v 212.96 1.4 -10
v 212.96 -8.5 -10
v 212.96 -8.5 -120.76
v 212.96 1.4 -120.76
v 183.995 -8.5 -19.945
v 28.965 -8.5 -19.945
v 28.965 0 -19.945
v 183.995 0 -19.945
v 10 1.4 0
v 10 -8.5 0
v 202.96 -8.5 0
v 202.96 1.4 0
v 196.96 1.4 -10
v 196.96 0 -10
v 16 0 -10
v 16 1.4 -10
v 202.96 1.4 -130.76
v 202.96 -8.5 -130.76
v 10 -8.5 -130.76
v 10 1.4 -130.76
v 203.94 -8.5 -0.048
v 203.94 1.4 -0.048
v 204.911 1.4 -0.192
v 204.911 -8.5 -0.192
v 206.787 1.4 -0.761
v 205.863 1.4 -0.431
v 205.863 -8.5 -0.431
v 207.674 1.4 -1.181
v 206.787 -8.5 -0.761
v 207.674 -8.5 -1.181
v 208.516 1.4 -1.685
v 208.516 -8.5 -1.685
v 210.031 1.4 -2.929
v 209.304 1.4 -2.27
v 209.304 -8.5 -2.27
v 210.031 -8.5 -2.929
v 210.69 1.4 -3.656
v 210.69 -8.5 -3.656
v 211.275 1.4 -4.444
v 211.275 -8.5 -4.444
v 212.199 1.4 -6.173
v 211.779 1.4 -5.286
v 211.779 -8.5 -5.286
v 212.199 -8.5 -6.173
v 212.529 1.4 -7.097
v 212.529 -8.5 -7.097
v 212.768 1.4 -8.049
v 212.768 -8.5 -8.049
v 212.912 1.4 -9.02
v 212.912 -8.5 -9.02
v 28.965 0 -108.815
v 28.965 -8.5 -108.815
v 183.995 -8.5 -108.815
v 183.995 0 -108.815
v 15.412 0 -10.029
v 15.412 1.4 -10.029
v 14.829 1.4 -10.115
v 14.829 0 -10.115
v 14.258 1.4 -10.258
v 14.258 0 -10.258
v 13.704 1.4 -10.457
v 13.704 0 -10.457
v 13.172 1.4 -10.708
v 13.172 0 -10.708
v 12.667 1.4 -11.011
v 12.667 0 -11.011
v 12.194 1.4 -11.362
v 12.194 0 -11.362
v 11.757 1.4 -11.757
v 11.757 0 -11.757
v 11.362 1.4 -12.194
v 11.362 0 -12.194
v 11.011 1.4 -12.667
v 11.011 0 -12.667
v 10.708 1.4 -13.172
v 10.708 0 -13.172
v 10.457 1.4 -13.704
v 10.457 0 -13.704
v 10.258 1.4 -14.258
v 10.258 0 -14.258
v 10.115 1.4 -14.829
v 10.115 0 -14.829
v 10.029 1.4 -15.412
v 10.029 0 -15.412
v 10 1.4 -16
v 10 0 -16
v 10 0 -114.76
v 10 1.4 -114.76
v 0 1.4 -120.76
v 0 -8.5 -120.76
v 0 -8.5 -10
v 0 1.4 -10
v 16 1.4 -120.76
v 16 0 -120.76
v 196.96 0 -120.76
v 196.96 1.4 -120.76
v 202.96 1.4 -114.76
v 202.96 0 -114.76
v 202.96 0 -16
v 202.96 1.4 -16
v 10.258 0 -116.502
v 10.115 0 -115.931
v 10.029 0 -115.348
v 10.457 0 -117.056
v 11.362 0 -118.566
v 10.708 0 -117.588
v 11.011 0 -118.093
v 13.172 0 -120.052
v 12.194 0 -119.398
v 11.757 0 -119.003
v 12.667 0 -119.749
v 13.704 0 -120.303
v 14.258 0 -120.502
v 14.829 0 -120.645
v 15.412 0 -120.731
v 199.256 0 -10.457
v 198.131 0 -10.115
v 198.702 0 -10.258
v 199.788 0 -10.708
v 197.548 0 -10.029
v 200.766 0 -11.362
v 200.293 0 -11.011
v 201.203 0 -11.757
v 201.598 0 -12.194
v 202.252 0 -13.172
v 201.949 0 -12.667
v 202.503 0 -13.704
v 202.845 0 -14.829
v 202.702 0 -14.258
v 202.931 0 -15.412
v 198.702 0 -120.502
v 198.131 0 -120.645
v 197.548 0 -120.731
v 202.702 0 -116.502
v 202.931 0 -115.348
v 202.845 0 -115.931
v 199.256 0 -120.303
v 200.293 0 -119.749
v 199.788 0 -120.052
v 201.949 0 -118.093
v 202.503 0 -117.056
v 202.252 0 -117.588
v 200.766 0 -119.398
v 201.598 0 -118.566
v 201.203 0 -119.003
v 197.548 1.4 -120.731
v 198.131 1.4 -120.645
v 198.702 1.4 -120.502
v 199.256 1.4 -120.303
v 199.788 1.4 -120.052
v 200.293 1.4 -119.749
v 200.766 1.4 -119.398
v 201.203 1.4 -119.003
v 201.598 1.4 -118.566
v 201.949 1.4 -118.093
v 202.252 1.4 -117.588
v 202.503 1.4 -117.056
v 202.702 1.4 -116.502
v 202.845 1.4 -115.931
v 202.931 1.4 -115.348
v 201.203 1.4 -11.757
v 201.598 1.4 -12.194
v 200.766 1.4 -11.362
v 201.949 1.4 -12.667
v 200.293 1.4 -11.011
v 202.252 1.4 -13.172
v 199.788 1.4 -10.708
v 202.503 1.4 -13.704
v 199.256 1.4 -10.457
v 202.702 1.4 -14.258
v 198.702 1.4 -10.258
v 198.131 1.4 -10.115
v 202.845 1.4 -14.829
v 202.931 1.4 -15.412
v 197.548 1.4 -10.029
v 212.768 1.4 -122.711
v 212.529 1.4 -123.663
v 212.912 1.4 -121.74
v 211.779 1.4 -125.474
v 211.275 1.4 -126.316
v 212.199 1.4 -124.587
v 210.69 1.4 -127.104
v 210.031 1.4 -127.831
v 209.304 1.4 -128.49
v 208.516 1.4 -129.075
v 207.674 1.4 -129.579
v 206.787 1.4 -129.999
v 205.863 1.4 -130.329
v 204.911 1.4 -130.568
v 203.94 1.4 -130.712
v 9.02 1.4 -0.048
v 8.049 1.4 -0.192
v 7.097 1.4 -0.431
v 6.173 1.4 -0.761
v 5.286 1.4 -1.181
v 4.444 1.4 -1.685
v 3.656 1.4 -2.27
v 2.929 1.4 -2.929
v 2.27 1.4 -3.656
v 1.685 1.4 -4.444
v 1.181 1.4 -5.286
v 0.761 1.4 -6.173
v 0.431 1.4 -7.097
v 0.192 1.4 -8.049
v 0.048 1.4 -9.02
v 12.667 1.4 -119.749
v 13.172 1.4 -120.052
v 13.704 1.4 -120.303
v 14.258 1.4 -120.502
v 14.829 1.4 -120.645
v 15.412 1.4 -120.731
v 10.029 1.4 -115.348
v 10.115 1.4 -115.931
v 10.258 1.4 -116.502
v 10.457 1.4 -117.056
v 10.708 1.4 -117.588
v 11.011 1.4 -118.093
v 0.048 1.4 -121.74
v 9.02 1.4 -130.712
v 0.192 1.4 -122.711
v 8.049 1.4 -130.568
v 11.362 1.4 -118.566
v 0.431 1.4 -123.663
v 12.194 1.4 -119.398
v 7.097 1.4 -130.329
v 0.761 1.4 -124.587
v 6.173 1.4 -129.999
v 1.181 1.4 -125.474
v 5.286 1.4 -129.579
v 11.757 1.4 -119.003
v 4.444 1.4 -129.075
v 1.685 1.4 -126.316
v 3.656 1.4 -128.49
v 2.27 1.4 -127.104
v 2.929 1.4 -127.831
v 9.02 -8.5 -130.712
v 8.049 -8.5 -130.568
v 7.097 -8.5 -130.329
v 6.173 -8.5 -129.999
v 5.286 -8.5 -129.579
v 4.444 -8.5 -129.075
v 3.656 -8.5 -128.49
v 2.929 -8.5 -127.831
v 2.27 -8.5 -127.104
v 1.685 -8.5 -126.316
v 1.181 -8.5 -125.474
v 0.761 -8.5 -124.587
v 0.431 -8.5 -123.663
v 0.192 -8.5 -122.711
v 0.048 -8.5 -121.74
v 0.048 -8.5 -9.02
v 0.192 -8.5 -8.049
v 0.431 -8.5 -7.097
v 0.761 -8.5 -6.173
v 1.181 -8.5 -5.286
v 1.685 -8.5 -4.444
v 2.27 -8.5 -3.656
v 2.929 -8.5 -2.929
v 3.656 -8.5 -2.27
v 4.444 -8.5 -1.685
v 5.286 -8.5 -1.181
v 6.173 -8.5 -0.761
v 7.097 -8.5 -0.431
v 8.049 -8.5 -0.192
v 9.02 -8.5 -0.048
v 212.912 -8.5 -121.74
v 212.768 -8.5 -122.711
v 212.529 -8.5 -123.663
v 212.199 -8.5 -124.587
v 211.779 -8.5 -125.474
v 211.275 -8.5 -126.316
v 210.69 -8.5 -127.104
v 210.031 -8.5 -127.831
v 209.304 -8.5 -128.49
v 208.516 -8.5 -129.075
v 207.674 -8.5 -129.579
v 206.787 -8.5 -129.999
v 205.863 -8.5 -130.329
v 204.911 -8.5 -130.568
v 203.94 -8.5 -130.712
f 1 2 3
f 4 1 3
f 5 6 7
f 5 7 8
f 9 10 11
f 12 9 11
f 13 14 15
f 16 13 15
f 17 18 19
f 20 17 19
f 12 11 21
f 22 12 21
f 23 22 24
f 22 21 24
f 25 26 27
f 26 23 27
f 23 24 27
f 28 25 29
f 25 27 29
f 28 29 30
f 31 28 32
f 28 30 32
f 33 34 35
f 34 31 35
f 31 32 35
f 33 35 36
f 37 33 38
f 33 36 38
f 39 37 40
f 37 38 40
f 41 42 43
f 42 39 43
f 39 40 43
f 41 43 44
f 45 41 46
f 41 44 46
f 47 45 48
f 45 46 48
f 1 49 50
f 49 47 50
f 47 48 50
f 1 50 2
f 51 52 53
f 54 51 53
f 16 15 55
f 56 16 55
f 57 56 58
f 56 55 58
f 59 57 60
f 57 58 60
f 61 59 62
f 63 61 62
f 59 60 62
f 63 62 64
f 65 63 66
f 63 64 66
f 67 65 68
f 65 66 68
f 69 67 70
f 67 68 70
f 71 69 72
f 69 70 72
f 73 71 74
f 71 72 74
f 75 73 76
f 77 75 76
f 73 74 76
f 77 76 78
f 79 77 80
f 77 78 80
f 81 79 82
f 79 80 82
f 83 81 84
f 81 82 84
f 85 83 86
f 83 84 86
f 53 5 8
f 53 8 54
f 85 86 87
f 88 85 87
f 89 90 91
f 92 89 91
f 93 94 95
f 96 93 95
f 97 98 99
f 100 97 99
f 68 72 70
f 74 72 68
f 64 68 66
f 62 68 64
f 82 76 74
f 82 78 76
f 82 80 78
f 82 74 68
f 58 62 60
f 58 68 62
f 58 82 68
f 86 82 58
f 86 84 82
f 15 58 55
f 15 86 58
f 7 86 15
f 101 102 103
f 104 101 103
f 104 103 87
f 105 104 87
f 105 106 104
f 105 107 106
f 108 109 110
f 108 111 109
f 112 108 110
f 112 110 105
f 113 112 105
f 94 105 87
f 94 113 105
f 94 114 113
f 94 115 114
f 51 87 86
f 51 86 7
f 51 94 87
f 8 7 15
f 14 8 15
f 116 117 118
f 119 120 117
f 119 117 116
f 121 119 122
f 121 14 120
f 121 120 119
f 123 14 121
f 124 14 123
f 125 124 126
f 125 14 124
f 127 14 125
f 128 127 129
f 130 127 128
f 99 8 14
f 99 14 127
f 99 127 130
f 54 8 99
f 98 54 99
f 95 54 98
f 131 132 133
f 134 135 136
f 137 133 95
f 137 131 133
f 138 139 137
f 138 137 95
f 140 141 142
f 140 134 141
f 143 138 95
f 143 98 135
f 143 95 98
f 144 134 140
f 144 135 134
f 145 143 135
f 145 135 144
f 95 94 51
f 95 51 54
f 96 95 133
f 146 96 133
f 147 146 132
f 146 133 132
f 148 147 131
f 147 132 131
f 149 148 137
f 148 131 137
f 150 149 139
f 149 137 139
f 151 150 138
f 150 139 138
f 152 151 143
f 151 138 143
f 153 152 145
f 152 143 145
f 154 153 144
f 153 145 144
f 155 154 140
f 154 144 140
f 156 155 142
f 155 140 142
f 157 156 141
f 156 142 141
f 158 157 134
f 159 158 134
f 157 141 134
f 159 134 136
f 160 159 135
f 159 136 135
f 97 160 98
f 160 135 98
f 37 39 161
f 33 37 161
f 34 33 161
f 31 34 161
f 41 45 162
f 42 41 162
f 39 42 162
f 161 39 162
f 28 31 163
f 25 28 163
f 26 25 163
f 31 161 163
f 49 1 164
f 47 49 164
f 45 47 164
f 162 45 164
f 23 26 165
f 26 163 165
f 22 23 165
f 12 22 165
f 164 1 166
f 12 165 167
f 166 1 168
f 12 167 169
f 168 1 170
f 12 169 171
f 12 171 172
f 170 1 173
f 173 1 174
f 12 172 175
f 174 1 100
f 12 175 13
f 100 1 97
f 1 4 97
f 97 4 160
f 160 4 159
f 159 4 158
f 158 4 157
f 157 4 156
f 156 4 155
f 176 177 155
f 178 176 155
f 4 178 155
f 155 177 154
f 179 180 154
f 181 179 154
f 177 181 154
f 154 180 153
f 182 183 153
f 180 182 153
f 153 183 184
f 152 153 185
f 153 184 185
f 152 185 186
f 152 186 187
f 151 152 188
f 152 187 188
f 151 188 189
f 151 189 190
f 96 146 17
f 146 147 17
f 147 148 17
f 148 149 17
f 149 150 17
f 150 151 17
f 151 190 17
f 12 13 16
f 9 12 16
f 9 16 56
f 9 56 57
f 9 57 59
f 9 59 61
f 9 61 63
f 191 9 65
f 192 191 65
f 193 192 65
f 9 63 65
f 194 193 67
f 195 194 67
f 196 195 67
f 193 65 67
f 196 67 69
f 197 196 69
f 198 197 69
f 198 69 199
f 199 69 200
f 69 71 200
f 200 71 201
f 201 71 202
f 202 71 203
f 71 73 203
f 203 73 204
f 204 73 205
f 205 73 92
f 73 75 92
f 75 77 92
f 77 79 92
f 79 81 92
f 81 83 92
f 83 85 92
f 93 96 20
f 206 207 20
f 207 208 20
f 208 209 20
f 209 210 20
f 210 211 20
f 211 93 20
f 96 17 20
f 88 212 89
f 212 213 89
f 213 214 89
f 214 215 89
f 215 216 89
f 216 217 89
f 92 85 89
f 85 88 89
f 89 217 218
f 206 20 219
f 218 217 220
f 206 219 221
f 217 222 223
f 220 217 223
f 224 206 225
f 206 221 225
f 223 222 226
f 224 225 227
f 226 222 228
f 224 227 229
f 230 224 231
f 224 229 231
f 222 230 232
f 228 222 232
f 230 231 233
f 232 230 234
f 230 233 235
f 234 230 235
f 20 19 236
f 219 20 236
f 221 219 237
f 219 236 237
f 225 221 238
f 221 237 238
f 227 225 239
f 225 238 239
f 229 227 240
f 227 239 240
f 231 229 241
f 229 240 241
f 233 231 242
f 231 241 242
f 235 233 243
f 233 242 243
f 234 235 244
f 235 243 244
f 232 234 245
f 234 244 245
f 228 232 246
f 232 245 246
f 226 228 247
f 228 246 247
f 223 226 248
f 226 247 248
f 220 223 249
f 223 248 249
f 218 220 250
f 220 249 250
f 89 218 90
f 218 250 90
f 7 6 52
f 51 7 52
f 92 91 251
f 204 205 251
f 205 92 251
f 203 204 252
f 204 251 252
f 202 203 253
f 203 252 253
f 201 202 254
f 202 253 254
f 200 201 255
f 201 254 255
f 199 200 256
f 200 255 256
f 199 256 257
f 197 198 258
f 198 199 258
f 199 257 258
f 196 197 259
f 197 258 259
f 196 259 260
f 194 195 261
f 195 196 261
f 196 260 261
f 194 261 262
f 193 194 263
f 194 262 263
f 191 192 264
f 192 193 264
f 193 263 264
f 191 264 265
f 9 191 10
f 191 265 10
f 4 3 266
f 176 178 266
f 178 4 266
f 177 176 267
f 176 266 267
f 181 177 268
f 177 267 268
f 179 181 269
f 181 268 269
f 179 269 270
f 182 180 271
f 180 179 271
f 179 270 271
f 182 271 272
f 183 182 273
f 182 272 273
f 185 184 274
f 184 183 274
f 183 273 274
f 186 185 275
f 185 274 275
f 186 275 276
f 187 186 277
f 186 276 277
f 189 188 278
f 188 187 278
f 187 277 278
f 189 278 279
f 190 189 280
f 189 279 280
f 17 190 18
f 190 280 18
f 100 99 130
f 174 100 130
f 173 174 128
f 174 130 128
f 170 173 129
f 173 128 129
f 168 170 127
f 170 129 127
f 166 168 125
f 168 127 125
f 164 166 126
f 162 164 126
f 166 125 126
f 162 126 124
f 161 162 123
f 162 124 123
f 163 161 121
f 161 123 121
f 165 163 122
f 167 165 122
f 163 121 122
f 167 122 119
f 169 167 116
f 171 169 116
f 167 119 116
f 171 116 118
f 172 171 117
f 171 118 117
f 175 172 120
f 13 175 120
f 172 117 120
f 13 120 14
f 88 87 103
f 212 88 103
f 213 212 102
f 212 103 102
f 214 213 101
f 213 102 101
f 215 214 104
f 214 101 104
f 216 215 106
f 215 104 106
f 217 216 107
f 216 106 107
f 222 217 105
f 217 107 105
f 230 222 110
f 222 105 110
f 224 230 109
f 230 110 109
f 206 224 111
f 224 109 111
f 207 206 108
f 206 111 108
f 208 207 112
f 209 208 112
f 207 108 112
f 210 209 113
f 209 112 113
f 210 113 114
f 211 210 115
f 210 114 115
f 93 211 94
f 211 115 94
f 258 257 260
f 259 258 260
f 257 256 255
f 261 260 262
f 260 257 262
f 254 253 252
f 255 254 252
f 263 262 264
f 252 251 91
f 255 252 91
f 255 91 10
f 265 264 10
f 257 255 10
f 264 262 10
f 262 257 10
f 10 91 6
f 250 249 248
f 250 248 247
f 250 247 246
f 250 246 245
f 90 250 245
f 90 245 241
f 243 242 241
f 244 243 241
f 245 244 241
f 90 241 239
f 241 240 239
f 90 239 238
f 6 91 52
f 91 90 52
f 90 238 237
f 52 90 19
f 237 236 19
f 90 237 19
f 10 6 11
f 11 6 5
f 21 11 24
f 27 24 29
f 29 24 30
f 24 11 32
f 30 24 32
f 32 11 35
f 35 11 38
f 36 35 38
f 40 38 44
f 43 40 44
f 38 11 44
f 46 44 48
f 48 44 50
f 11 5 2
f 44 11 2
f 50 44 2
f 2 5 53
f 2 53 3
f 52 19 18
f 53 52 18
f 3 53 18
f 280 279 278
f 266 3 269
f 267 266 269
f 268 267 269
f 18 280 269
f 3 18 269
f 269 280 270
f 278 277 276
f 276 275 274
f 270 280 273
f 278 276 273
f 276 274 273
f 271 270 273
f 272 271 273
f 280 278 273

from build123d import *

# Parameters (mm, degrees)
BOSS_EXTRUDE1_DEPTH = 1.4
BOSS_EXTRUDE2_START = -8.5
FRONT_FACE_3_W      = 155.03
FRONT_FACE_3_H      = 88.87
BOSS_EXTRUDE2_DEPTH = 8.5


with BuildPart() as part:
    # Front Face → Boss-Extrude1 (new body)
    with BuildSketch(Plane(origin=(0, 0, 0), x_dir=(1, 0, 0), z_dir=(0, 1, 0))):
        with BuildLine():
            ThreePointArc((0, 10), (2.928932188, 2.928932188), (10, 0))
            Line((10, 0), (202.96, 0))
            ThreePointArc((202.96, 0), (210.031067812, 2.928932188), (212.96, 10))
            Line((212.96, 10), (212.96, 120.76))
            ThreePointArc((212.96, 120.76), (210.031067812, 127.831067812), (202.96, 130.76))
            Line((202.96, 130.76), (10, 130.76))
            ThreePointArc((10, 130.76), (2.928932188, 127.831067812), (0, 120.76))
            Line((0, 120.76), (0, 10))
        make_face()
        with BuildLine():
            Line((196.96, 10), (16, 10))
            ThreePointArc((16, 10), (11.757359313, 11.757359313), (10, 16))
            Line((10, 16), (10, 114.76))
            ThreePointArc((10, 114.76), (11.757359313, 119.002640687), (16, 120.76))
            Line((16, 120.76), (196.96, 120.76))
            ThreePointArc((196.96, 120.76), (201.202640687, 119.002640687), (202.96, 114.76))
            Line((202.96, 114.76), (202.96, 16))
            ThreePointArc((202.96, 16), (201.202640687, 11.757359313), (196.96, 10))
        make_face(mode=Mode.SUBTRACT)
    extrude(amount=BOSS_EXTRUDE1_DEPTH)

    # Front Face<3> → Boss-Extrude2 (add)
    with BuildSketch(Plane(origin=(0, 0, 0), x_dir=(1, 0, 0), z_dir=(0, 1, 0)).offset(BOSS_EXTRUDE2_START)):
        with BuildLine():
            ThreePointArc((0, 10), (2.928932188, 2.928932188), (10, 0))
            Line((10, 0), (202.96, 0))
            ThreePointArc((202.96, 0), (210.031067812, 2.928932188), (212.96, 10))
            Line((212.96, 10), (212.96, 120.76))
            ThreePointArc((212.96, 120.76), (210.031067812, 127.831067812), (202.96, 130.76))
            Line((202.96, 130.76), (10, 130.76))
            ThreePointArc((10, 130.76), (2.928932188, 127.831067812), (0, 120.76))
            Line((0, 120.76), (0, 10))
        make_face()
        with Locations((106.48, 64.38)):
            Rectangle(FRONT_FACE_3_W, FRONT_FACE_3_H, mode=Mode.SUBTRACT)
    extrude(amount=BOSS_EXTRUDE2_DEPTH)


solid = part.part
